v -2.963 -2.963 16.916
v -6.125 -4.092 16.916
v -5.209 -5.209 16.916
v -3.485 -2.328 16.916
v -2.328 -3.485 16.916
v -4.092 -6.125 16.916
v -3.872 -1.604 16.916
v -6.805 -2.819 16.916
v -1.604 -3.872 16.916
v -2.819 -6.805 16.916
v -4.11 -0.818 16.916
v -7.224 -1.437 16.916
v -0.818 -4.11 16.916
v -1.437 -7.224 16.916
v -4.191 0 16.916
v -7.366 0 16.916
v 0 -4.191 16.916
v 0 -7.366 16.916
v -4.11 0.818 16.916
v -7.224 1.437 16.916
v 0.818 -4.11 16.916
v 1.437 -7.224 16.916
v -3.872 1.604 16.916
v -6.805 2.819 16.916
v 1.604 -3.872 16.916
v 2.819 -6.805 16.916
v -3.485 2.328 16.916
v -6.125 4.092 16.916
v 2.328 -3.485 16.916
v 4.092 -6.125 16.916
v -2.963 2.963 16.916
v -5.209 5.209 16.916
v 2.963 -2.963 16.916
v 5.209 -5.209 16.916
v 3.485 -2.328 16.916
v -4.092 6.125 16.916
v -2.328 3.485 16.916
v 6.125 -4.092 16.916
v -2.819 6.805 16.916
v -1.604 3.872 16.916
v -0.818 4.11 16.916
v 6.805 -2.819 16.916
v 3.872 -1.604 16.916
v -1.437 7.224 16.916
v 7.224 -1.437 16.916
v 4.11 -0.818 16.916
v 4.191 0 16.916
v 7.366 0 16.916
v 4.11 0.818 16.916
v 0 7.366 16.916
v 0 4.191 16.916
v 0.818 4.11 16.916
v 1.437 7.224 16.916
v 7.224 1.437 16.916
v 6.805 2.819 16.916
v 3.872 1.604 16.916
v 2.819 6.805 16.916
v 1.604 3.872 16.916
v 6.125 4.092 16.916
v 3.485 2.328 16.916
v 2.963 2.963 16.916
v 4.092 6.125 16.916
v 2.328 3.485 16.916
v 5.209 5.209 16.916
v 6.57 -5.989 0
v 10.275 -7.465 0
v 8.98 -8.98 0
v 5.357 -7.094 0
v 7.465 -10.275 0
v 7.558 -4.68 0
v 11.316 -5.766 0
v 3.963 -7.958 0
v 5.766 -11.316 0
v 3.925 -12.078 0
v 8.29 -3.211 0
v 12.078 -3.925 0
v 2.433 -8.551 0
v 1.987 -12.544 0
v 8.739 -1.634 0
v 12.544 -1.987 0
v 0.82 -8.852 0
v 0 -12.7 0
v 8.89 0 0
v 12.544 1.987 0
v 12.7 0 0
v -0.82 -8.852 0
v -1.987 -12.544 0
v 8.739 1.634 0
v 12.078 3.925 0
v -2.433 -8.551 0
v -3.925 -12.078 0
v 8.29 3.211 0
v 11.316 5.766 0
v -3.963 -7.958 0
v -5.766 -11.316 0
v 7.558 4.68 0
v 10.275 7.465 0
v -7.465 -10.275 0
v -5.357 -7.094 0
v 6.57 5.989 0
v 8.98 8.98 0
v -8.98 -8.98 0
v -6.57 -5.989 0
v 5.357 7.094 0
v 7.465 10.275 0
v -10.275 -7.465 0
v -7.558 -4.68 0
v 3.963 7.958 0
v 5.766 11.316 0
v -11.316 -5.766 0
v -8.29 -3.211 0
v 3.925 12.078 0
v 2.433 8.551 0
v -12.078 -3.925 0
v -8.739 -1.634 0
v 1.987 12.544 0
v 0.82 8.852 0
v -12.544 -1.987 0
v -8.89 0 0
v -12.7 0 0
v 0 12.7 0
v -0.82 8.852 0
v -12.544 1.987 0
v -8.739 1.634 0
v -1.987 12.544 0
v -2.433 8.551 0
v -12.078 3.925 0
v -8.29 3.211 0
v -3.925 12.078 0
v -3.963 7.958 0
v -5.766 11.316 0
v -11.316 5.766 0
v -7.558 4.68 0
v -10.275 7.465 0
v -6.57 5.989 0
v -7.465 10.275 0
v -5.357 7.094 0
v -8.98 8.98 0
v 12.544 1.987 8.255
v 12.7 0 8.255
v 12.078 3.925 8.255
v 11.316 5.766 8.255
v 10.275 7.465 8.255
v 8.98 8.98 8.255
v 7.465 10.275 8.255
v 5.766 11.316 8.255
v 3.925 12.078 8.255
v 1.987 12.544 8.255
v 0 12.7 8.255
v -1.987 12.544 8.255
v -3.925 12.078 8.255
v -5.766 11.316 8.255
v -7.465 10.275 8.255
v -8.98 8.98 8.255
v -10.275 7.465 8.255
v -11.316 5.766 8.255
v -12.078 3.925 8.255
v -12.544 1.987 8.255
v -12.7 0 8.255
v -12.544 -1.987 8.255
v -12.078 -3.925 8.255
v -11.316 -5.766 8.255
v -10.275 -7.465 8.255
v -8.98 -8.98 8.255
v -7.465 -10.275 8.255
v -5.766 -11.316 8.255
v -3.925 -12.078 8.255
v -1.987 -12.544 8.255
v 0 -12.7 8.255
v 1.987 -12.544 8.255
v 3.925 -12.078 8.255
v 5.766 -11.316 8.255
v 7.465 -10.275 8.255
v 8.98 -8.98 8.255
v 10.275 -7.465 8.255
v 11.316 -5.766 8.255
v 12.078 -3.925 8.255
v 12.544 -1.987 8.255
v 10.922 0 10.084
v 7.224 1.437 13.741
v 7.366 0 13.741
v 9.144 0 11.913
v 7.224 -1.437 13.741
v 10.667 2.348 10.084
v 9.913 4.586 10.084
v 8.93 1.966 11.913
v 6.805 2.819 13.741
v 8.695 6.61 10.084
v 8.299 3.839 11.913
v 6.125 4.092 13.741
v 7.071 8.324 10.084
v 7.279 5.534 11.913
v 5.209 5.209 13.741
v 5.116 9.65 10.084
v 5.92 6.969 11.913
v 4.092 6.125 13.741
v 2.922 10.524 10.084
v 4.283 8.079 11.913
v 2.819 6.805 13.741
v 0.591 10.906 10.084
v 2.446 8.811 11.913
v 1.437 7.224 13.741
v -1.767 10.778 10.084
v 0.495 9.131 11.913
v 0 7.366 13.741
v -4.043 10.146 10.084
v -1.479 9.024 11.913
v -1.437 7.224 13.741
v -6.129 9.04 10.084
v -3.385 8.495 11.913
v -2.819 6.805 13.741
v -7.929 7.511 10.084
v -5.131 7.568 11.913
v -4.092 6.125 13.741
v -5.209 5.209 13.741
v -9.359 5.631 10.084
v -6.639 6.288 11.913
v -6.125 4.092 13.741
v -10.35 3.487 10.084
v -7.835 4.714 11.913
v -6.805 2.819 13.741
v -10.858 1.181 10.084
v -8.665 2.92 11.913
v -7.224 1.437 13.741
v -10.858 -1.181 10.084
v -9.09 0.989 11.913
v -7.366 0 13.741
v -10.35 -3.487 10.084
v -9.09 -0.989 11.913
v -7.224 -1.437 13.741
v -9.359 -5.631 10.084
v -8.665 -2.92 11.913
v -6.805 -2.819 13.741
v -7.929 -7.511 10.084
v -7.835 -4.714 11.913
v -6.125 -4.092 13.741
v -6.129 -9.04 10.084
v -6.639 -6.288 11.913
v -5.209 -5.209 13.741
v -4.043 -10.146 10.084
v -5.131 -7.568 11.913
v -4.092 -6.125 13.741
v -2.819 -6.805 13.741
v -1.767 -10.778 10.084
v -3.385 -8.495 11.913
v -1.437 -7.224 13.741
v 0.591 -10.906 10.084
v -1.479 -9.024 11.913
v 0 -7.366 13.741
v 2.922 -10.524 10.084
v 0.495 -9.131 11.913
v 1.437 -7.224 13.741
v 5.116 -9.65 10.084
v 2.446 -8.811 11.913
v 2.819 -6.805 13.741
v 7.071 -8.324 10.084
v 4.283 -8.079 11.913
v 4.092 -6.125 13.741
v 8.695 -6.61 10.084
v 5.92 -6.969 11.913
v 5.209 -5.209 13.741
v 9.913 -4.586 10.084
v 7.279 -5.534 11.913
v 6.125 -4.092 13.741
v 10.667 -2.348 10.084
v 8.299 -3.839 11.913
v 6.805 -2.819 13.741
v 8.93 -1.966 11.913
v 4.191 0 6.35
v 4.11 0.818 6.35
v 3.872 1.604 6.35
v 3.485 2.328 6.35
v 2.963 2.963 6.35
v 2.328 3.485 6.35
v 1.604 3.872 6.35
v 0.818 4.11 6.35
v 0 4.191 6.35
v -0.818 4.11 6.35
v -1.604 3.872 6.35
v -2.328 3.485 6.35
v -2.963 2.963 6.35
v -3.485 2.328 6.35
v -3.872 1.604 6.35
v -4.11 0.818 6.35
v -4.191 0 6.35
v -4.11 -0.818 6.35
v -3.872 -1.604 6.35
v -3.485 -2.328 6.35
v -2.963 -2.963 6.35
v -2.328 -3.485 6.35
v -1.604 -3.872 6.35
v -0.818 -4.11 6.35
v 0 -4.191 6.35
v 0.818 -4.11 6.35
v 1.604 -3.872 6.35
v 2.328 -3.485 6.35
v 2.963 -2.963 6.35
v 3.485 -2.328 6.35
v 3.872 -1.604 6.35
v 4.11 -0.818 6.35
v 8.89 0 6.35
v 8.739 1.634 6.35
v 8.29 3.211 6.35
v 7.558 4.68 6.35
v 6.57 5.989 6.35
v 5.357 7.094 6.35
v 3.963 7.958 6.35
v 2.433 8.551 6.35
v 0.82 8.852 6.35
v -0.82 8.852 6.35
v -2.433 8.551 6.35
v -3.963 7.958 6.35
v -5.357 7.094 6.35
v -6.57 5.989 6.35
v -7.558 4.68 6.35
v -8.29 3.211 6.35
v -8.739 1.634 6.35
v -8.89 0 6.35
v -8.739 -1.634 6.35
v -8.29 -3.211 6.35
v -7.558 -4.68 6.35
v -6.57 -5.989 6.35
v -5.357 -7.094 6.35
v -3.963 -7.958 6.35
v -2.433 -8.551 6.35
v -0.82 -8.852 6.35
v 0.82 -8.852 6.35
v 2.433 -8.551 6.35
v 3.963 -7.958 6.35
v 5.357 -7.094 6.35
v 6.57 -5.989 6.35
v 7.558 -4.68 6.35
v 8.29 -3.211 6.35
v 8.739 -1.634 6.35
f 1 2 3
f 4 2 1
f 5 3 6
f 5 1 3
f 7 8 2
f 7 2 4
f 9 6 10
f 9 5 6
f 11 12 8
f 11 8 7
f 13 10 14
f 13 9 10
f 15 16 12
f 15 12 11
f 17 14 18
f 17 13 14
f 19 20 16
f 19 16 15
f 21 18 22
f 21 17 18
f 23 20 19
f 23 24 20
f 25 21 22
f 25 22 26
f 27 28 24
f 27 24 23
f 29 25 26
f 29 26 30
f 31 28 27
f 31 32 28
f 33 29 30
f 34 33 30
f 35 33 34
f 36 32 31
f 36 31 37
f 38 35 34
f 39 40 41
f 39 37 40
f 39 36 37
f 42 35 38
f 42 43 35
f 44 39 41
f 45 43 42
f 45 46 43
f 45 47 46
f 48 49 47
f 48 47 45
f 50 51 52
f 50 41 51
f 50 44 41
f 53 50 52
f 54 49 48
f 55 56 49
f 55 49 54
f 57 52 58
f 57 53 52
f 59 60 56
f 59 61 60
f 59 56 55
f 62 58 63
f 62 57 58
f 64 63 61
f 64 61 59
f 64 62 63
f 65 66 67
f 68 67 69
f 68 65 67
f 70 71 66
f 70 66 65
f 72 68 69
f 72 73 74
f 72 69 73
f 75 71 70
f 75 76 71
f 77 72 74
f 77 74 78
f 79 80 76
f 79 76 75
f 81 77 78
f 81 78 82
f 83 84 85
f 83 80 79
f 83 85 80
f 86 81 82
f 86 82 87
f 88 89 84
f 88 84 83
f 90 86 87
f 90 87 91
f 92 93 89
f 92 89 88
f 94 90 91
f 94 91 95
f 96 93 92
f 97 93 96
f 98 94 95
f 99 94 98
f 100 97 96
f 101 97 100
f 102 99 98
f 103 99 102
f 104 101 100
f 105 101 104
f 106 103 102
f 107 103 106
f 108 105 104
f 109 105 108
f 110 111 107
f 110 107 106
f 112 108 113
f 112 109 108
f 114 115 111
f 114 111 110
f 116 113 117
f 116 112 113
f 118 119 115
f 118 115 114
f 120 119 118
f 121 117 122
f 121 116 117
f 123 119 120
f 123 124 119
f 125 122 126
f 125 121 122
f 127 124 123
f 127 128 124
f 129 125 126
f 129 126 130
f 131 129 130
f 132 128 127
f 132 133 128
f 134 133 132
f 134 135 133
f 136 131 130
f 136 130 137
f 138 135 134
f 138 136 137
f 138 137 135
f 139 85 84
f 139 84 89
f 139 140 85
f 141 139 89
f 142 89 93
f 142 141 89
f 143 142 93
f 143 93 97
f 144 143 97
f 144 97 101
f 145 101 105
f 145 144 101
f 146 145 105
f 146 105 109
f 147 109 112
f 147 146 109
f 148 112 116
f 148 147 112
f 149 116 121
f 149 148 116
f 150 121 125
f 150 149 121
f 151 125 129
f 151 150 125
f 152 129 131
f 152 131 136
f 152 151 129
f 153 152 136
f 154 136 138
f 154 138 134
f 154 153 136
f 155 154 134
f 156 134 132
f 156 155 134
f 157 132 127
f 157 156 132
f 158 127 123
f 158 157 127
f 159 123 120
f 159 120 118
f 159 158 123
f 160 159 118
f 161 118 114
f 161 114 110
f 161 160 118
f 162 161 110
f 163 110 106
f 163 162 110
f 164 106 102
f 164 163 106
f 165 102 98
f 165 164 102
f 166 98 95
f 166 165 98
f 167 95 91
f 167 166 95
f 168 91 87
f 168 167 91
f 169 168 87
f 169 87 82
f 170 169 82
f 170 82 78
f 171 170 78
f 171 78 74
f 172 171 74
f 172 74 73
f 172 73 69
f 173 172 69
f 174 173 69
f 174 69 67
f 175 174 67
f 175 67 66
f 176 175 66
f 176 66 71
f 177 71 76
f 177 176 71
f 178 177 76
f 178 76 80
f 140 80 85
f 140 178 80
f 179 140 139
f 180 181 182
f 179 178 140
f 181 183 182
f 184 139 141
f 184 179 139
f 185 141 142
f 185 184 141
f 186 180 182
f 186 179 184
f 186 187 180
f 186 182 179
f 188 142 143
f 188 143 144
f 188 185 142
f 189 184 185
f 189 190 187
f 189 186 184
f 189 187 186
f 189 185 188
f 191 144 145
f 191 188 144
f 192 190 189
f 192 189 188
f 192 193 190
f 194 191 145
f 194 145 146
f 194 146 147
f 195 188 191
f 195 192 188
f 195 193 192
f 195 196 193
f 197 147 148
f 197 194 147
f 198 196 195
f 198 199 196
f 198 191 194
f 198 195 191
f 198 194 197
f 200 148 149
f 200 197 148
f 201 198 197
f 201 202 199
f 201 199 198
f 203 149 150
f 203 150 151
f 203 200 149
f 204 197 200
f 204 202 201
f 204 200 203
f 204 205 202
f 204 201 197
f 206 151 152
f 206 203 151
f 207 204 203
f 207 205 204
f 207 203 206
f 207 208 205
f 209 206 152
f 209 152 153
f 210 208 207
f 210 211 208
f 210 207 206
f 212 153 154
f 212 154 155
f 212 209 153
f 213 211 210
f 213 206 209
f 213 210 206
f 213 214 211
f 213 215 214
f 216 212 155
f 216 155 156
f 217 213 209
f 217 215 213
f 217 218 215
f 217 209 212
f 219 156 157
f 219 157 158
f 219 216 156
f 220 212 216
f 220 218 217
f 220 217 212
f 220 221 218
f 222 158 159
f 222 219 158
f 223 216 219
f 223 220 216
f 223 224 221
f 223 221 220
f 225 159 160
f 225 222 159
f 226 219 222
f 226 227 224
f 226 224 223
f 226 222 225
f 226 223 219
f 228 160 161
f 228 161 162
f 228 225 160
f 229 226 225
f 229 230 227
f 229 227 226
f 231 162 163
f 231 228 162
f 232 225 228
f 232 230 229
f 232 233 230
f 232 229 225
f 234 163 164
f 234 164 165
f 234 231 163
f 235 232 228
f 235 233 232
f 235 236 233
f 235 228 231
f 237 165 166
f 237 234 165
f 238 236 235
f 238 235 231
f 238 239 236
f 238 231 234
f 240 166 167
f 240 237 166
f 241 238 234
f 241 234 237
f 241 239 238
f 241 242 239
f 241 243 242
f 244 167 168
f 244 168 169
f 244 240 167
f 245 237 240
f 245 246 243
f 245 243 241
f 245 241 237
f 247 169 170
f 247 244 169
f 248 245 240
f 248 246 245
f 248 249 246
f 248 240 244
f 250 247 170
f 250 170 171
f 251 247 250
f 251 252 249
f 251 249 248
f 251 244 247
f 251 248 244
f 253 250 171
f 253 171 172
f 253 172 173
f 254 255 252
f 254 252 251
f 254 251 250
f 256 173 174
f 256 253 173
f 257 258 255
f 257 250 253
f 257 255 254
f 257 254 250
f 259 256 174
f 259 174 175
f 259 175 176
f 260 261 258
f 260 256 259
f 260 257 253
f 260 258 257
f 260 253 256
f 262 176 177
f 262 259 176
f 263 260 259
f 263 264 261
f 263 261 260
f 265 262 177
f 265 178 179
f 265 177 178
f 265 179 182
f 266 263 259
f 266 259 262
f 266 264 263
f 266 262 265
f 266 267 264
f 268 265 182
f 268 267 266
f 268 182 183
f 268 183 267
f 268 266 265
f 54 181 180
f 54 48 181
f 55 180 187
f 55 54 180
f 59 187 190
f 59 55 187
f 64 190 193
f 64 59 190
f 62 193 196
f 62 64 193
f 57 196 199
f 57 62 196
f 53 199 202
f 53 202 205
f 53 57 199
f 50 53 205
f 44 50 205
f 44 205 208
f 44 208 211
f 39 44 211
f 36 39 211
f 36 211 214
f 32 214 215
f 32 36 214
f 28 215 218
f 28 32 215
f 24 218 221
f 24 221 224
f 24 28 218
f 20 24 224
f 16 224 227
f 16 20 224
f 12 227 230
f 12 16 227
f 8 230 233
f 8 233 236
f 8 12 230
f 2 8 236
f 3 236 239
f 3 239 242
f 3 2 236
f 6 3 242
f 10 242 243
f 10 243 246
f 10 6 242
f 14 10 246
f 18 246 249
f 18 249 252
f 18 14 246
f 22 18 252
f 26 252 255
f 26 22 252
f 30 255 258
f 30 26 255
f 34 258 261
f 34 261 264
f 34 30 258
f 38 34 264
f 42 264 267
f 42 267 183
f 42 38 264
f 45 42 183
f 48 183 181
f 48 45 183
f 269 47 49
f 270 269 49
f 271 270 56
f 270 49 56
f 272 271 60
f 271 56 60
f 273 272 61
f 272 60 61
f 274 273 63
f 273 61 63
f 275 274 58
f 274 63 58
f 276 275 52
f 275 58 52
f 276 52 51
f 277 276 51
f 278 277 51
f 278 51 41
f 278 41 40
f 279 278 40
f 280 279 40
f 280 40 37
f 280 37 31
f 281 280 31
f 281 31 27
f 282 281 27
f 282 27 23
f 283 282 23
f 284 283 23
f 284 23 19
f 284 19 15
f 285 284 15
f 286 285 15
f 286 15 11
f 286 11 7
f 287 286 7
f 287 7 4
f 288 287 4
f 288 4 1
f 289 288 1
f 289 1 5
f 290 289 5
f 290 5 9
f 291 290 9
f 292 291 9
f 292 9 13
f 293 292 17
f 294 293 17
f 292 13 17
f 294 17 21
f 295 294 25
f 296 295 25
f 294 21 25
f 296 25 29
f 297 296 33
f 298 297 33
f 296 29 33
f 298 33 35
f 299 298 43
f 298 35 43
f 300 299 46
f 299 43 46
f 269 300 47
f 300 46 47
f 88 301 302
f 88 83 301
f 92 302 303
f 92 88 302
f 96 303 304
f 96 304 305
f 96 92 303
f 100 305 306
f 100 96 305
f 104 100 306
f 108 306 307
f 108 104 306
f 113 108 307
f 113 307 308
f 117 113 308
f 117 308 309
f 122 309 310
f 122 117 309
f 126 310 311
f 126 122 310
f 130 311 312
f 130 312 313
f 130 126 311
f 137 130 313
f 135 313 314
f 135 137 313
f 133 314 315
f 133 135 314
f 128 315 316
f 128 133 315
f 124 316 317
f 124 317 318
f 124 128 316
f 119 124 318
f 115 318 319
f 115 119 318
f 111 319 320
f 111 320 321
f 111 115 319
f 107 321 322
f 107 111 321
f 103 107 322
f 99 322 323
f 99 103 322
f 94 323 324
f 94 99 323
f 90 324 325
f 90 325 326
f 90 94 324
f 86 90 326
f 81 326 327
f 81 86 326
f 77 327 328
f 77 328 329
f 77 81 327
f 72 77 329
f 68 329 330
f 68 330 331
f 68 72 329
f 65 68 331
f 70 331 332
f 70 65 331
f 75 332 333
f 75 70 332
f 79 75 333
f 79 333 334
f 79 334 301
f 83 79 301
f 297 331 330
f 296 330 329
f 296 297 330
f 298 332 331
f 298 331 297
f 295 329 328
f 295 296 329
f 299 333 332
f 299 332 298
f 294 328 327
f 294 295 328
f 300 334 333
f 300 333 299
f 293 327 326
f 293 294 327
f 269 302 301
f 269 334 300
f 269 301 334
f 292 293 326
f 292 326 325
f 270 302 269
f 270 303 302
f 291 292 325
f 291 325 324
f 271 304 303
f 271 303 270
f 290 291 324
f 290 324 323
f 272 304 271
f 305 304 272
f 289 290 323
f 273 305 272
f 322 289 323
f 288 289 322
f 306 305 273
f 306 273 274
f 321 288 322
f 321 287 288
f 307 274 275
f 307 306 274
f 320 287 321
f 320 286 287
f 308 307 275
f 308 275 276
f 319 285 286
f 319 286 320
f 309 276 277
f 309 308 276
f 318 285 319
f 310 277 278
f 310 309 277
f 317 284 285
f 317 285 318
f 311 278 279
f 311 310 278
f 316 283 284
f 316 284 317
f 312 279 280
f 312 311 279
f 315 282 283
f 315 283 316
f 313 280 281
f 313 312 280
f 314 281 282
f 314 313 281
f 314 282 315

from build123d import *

# Parameters (mm, degrees)
F2_R     = 4.191
F3_DEPTH = 25.4


with BuildPart() as f1:
    # F0 (on Front) → F1 (revolve)
    with BuildSketch(Plane.XZ):
        Polygon((8.89, 6.35), (8.89, 0), (12.7, 0), (12.7, 8.255), (7.366, 13.7414), (7.366, 16.9164), (0, 16.9164), (0, 6.35), align=None)
    revolve(axis=Axis((0, 0, 11.6332), (0, 0, 1)))

    # F2 (on face) → F3 (cut)
    with BuildSketch(Plane.XY.offset(16.9164)):
        Circle(F2_R)
    extrude(amount=-F3_DEPTH, mode=Mode.SUBTRACT)


solid = f1.part
